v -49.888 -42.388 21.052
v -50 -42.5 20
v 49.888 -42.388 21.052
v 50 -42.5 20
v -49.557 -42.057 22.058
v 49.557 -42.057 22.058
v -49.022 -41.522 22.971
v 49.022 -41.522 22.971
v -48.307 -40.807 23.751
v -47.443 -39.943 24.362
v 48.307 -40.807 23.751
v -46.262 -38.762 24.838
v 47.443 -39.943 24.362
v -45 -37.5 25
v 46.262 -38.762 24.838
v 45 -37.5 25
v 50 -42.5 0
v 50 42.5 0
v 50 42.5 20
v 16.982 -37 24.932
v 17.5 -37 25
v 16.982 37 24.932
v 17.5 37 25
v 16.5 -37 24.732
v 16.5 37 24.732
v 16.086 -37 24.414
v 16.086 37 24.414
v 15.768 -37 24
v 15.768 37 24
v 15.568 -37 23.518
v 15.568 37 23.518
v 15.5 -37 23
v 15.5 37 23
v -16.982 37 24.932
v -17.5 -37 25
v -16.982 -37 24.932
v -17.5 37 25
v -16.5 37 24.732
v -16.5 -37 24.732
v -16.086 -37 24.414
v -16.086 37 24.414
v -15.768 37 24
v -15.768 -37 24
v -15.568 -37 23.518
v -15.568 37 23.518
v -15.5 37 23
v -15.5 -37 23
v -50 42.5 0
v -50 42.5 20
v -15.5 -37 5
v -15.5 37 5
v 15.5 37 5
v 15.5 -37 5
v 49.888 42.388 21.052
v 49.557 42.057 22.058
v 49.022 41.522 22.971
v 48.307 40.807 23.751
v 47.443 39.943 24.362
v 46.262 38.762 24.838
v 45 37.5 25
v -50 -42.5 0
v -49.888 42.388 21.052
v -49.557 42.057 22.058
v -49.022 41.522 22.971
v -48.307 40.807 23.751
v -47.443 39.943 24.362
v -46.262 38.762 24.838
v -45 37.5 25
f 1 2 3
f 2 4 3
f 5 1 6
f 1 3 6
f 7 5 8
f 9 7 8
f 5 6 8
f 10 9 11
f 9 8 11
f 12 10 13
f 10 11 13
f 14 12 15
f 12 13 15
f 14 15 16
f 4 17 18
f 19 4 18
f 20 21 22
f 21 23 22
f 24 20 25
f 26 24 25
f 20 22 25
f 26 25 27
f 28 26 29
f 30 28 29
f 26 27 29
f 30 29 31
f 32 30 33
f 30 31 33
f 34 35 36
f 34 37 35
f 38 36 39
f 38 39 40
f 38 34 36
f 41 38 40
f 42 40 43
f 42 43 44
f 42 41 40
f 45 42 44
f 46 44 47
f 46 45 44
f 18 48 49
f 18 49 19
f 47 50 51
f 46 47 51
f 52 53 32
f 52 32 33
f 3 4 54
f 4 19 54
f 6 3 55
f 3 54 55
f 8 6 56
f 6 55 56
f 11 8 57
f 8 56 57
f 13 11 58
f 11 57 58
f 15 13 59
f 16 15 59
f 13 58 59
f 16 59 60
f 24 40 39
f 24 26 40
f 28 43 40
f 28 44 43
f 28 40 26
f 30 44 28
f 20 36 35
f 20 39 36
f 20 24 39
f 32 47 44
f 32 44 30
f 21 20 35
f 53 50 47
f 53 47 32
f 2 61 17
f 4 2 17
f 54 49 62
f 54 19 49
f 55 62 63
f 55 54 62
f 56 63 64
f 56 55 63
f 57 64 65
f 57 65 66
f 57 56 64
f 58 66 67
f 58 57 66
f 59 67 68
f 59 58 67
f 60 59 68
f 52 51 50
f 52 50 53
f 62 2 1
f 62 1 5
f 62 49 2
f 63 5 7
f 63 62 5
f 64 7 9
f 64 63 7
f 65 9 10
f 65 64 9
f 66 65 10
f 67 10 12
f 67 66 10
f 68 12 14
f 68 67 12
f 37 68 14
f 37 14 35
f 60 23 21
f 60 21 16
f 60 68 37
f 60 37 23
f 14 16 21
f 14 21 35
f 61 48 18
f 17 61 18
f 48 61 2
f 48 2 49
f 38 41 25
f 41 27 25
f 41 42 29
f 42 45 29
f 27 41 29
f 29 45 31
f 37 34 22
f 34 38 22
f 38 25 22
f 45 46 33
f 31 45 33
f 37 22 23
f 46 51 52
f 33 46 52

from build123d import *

# Parameters (mm, degrees)
F0_W     = 100
F0_H     = 85
F0_W_2   = 31
F0_H_2   = 74
F1_DEPTH = 25
F2_DEPTH = 5
F3_R     = 5
F4_R     = 2


with BuildPart() as f1:
    # F0 (on Top) → F1 (new body)
    with BuildSketch(Plane.XY):
        Rectangle(F0_W, F0_H)
        Rectangle(F0_W_2, F0_H_2, mode=Mode.SUBTRACT)
    extrude(amount=F1_DEPTH)

    # F0 (on Top) → F2 (join)
    with BuildSketch(Plane.XY):
        Rectangle(F0_W_2, F0_H_2)
    extrude(amount=F2_DEPTH)

    # F3
    f3_edges = [f1.edges().sort_by_distance(p)[0] for p in [
        (0, 42.5, 25),
        (-50, 0, 25),
        (0, -42.5, 25),
        (50, 0, 25),
    ]]
    fillet(f3_edges, radius=F3_R)

    # F4
    f4_edges = [f1.edges().sort_by_distance(p)[0] for p in [
        (-15.5, 0, 25),
        (15.5, 0, 25),
    ]]
    fillet(f4_edges, radius=F4_R)


solid = f1.part
